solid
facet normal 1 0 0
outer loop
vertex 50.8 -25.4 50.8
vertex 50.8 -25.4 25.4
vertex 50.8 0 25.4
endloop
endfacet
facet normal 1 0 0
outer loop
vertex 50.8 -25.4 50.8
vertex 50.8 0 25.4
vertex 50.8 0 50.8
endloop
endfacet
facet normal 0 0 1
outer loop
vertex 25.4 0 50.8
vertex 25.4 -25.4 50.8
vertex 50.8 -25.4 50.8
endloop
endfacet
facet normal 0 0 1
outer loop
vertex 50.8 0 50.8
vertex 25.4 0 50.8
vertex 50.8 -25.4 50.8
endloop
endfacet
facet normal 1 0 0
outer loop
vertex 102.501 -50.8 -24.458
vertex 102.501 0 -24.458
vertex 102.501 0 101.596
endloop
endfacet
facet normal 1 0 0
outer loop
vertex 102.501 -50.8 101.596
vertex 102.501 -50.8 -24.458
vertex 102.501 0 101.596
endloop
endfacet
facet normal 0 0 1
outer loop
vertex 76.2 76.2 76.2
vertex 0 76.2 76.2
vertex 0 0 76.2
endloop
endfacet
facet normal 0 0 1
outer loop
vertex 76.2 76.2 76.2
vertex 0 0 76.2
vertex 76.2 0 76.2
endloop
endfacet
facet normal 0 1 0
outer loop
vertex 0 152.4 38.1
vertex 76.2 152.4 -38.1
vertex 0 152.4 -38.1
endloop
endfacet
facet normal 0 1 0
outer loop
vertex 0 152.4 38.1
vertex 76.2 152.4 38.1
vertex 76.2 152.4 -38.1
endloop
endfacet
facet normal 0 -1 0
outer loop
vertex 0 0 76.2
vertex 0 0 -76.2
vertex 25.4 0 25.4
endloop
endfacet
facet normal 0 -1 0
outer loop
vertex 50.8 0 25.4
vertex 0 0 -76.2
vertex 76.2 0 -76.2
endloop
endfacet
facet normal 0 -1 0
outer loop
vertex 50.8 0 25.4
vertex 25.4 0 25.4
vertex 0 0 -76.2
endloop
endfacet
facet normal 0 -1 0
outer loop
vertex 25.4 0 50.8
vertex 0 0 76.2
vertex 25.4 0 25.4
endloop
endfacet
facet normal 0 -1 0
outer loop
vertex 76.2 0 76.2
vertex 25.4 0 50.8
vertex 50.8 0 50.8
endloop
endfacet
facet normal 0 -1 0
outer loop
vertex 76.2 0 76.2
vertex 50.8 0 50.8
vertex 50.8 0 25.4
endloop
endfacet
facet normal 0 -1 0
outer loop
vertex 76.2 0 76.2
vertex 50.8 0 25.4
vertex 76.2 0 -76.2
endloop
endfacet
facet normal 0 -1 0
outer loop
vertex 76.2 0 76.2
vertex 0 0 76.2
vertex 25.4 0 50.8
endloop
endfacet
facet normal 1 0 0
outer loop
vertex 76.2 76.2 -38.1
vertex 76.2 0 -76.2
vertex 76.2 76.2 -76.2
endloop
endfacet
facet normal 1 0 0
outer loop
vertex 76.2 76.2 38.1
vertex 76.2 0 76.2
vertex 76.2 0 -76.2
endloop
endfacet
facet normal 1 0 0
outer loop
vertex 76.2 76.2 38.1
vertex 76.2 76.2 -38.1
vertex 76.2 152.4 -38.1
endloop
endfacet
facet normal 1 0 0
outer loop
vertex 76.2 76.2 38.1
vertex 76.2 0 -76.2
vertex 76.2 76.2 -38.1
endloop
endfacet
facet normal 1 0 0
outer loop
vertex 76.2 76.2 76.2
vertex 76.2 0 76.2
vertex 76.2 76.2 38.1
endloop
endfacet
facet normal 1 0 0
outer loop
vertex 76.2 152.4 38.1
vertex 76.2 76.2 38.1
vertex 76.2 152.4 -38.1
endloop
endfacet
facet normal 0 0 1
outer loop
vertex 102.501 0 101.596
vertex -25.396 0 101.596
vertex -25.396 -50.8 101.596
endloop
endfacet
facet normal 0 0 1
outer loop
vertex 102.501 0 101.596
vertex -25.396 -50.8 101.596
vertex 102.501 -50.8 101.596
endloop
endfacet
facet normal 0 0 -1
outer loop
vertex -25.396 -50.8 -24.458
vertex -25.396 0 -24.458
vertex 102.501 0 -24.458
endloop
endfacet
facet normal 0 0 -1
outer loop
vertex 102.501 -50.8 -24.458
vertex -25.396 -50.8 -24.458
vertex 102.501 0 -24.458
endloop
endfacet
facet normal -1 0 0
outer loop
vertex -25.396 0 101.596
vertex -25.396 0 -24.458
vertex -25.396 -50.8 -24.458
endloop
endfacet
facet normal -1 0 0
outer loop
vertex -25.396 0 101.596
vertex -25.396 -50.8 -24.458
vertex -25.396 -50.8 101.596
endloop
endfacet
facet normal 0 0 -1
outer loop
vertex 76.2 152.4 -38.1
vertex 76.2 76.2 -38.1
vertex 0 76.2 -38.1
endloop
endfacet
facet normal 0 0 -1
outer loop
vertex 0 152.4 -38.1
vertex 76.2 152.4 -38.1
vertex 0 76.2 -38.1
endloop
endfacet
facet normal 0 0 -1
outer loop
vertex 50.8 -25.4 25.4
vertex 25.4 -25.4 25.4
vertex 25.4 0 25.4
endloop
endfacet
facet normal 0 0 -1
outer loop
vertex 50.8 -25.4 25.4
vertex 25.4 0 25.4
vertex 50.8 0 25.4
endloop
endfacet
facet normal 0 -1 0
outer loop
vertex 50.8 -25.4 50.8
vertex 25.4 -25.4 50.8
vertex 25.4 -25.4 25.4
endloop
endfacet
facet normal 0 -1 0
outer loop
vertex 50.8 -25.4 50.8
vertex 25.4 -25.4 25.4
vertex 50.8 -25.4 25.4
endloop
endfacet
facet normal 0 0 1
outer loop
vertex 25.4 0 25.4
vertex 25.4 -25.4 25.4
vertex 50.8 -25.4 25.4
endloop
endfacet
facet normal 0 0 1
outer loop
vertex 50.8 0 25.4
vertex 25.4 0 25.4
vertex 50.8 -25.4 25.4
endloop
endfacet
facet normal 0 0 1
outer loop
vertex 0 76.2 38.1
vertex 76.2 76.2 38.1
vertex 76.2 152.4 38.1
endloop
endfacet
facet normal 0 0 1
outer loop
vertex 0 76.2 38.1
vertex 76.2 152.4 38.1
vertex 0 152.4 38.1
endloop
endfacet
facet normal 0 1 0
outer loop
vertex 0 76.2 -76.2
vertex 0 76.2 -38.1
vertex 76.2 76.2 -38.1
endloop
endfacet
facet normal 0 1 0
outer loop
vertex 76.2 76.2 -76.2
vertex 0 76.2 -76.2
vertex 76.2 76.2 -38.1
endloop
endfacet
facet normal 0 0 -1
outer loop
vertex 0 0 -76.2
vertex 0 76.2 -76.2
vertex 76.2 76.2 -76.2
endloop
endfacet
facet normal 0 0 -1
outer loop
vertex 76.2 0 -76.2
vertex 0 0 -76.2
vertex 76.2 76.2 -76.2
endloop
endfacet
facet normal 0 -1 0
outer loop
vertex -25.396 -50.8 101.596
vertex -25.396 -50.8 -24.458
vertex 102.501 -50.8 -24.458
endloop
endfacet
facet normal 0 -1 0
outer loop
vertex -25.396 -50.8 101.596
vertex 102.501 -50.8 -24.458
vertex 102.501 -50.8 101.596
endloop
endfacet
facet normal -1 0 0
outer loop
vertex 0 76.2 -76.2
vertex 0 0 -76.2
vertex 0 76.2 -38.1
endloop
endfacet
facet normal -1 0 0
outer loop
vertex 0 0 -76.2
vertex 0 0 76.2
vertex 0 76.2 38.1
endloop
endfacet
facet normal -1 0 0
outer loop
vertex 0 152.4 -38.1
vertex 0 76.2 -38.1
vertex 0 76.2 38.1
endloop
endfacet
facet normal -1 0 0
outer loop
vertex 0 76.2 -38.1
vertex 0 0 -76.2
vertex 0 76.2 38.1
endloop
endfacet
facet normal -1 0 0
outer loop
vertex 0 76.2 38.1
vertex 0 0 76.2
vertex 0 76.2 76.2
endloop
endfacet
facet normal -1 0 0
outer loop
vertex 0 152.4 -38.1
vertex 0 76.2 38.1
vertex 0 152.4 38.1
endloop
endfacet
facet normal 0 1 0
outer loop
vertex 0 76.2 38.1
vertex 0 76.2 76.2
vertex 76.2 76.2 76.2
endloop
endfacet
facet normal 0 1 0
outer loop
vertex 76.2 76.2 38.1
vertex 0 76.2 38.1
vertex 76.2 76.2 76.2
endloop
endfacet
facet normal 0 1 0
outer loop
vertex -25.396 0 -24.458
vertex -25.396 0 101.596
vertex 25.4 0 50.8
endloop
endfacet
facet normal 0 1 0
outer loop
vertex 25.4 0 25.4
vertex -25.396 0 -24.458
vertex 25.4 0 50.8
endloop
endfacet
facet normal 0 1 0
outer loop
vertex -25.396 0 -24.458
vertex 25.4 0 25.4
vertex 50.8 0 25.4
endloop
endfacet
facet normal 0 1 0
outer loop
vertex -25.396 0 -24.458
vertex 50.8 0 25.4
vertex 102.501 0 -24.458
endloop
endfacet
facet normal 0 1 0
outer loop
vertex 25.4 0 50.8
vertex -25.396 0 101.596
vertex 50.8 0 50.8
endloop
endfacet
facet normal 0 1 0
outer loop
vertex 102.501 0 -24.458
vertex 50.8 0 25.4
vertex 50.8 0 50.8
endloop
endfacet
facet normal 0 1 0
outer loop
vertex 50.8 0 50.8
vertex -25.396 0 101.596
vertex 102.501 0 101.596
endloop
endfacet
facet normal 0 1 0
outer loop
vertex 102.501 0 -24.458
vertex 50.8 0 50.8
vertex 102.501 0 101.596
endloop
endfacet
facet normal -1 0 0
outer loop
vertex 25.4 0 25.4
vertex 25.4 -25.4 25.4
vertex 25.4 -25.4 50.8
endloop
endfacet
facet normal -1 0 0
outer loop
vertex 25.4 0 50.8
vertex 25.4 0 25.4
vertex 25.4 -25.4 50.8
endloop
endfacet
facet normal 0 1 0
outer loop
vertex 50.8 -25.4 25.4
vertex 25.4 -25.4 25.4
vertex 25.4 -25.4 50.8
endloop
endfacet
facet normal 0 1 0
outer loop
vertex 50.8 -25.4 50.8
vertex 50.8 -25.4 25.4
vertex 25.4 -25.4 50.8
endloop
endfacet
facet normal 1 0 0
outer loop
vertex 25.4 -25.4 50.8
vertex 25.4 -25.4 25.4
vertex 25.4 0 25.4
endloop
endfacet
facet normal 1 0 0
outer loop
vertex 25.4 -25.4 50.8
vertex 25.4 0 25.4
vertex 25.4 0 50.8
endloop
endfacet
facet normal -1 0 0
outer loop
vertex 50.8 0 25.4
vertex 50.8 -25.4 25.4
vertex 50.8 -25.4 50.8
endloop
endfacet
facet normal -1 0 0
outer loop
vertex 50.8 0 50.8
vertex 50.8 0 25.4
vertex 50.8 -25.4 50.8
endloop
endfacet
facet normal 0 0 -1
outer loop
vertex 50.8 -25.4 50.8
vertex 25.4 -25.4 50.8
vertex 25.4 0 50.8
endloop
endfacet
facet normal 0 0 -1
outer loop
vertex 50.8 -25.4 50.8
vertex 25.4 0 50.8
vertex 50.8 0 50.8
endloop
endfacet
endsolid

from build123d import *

# Parameters (mm, degrees)
F0_W      = 76.2
F0_H      = 76.2
F1_DEPTH  = 76.2
F2_W      = 25.4
F2_H      = 25.4
F3_DEPTH  = 25.4
F4_W      = 127.8971601269
F4_H      = 126.0540452983
F4_W_2    = 76.2
F4_H_2    = 76.2
F4_W_3    = 25.4
F4_H_3    = 25.4
F5_DEPTH  = 50.8
F6_W      = 25.4
F6_H      = 25.4
F7_DEPTH  = 25.4
F8_DEPTH  = 76.2
F9_W      = 76.2
F9_H      = 38.1
F10_DEPTH = 76.2


with BuildPart() as f1:
    # F0 (on Top) → F1 (new body)
    with BuildSketch(Plane.XY):
        with Locations((38.1, 38.1)):
            Rectangle(F0_W, F0_H)
    extrude(amount=F1_DEPTH)

    # F2 (on face) → F3 (join)
    with BuildSketch(Plane.XZ):
        with Locations((38.1, 38.1)):
            Rectangle(F2_W, F2_H)
    extrude(amount=F3_DEPTH)


with BuildPart() as f5:
    # F4 (on face) → F5 (new body)
    with BuildSketch(Plane.XZ):
        with Locations((38.5524157531, 38.5691416612)):
            Rectangle(F4_W, F4_H)
        with Locations((38.1, 38.1)):
            Rectangle(F4_W_2, F4_H_2, mode=Mode.SUBTRACT)
        with Locations((38.1, 38.1)):
            Rectangle(F4_W_2, F4_H_2)
        with Locations((38.1, 38.1)):
            Rectangle(F4_W_3, F4_H_3, mode=Mode.SUBTRACT)
    extrude(amount=F5_DEPTH)

    # F6 (on face) → F7 (join)
    with BuildSketch(Plane.YZ.offset(25.4)):
        with Locations((-38.1, 38.1)):
            Rectangle(F6_W, F6_H)
    extrude(amount=F7_DEPTH)


with BuildPart() as f8:
    # F8 (new): a face of the model
    f8_faces = [f1.part.faces().sort_by_distance(p)[0] for p in [
        (38.1, 38.1, 0),
    ]]
    extrude(f8_faces, amount=F8_DEPTH)


with BuildPart() as f1_1:
    add(f1.part)

    add(f8.part)  # F10 merges F8
    # F9 (on face) → F10 (join)
    with BuildSketch(Plane(origin=(0, 76.2, 0), x_dir=(-1, 0, 0), z_dir=(0, 1, 0))):
        with Locations((-38.1, -19.05)):
            Rectangle(F9_W, F9_H)
        with Locations((-38.1, 19.05)):
            Rectangle(F9_W, F9_H)
    extrude(amount=F10_DEPTH)


solid = Compound([f5.part, f1_1.part])
